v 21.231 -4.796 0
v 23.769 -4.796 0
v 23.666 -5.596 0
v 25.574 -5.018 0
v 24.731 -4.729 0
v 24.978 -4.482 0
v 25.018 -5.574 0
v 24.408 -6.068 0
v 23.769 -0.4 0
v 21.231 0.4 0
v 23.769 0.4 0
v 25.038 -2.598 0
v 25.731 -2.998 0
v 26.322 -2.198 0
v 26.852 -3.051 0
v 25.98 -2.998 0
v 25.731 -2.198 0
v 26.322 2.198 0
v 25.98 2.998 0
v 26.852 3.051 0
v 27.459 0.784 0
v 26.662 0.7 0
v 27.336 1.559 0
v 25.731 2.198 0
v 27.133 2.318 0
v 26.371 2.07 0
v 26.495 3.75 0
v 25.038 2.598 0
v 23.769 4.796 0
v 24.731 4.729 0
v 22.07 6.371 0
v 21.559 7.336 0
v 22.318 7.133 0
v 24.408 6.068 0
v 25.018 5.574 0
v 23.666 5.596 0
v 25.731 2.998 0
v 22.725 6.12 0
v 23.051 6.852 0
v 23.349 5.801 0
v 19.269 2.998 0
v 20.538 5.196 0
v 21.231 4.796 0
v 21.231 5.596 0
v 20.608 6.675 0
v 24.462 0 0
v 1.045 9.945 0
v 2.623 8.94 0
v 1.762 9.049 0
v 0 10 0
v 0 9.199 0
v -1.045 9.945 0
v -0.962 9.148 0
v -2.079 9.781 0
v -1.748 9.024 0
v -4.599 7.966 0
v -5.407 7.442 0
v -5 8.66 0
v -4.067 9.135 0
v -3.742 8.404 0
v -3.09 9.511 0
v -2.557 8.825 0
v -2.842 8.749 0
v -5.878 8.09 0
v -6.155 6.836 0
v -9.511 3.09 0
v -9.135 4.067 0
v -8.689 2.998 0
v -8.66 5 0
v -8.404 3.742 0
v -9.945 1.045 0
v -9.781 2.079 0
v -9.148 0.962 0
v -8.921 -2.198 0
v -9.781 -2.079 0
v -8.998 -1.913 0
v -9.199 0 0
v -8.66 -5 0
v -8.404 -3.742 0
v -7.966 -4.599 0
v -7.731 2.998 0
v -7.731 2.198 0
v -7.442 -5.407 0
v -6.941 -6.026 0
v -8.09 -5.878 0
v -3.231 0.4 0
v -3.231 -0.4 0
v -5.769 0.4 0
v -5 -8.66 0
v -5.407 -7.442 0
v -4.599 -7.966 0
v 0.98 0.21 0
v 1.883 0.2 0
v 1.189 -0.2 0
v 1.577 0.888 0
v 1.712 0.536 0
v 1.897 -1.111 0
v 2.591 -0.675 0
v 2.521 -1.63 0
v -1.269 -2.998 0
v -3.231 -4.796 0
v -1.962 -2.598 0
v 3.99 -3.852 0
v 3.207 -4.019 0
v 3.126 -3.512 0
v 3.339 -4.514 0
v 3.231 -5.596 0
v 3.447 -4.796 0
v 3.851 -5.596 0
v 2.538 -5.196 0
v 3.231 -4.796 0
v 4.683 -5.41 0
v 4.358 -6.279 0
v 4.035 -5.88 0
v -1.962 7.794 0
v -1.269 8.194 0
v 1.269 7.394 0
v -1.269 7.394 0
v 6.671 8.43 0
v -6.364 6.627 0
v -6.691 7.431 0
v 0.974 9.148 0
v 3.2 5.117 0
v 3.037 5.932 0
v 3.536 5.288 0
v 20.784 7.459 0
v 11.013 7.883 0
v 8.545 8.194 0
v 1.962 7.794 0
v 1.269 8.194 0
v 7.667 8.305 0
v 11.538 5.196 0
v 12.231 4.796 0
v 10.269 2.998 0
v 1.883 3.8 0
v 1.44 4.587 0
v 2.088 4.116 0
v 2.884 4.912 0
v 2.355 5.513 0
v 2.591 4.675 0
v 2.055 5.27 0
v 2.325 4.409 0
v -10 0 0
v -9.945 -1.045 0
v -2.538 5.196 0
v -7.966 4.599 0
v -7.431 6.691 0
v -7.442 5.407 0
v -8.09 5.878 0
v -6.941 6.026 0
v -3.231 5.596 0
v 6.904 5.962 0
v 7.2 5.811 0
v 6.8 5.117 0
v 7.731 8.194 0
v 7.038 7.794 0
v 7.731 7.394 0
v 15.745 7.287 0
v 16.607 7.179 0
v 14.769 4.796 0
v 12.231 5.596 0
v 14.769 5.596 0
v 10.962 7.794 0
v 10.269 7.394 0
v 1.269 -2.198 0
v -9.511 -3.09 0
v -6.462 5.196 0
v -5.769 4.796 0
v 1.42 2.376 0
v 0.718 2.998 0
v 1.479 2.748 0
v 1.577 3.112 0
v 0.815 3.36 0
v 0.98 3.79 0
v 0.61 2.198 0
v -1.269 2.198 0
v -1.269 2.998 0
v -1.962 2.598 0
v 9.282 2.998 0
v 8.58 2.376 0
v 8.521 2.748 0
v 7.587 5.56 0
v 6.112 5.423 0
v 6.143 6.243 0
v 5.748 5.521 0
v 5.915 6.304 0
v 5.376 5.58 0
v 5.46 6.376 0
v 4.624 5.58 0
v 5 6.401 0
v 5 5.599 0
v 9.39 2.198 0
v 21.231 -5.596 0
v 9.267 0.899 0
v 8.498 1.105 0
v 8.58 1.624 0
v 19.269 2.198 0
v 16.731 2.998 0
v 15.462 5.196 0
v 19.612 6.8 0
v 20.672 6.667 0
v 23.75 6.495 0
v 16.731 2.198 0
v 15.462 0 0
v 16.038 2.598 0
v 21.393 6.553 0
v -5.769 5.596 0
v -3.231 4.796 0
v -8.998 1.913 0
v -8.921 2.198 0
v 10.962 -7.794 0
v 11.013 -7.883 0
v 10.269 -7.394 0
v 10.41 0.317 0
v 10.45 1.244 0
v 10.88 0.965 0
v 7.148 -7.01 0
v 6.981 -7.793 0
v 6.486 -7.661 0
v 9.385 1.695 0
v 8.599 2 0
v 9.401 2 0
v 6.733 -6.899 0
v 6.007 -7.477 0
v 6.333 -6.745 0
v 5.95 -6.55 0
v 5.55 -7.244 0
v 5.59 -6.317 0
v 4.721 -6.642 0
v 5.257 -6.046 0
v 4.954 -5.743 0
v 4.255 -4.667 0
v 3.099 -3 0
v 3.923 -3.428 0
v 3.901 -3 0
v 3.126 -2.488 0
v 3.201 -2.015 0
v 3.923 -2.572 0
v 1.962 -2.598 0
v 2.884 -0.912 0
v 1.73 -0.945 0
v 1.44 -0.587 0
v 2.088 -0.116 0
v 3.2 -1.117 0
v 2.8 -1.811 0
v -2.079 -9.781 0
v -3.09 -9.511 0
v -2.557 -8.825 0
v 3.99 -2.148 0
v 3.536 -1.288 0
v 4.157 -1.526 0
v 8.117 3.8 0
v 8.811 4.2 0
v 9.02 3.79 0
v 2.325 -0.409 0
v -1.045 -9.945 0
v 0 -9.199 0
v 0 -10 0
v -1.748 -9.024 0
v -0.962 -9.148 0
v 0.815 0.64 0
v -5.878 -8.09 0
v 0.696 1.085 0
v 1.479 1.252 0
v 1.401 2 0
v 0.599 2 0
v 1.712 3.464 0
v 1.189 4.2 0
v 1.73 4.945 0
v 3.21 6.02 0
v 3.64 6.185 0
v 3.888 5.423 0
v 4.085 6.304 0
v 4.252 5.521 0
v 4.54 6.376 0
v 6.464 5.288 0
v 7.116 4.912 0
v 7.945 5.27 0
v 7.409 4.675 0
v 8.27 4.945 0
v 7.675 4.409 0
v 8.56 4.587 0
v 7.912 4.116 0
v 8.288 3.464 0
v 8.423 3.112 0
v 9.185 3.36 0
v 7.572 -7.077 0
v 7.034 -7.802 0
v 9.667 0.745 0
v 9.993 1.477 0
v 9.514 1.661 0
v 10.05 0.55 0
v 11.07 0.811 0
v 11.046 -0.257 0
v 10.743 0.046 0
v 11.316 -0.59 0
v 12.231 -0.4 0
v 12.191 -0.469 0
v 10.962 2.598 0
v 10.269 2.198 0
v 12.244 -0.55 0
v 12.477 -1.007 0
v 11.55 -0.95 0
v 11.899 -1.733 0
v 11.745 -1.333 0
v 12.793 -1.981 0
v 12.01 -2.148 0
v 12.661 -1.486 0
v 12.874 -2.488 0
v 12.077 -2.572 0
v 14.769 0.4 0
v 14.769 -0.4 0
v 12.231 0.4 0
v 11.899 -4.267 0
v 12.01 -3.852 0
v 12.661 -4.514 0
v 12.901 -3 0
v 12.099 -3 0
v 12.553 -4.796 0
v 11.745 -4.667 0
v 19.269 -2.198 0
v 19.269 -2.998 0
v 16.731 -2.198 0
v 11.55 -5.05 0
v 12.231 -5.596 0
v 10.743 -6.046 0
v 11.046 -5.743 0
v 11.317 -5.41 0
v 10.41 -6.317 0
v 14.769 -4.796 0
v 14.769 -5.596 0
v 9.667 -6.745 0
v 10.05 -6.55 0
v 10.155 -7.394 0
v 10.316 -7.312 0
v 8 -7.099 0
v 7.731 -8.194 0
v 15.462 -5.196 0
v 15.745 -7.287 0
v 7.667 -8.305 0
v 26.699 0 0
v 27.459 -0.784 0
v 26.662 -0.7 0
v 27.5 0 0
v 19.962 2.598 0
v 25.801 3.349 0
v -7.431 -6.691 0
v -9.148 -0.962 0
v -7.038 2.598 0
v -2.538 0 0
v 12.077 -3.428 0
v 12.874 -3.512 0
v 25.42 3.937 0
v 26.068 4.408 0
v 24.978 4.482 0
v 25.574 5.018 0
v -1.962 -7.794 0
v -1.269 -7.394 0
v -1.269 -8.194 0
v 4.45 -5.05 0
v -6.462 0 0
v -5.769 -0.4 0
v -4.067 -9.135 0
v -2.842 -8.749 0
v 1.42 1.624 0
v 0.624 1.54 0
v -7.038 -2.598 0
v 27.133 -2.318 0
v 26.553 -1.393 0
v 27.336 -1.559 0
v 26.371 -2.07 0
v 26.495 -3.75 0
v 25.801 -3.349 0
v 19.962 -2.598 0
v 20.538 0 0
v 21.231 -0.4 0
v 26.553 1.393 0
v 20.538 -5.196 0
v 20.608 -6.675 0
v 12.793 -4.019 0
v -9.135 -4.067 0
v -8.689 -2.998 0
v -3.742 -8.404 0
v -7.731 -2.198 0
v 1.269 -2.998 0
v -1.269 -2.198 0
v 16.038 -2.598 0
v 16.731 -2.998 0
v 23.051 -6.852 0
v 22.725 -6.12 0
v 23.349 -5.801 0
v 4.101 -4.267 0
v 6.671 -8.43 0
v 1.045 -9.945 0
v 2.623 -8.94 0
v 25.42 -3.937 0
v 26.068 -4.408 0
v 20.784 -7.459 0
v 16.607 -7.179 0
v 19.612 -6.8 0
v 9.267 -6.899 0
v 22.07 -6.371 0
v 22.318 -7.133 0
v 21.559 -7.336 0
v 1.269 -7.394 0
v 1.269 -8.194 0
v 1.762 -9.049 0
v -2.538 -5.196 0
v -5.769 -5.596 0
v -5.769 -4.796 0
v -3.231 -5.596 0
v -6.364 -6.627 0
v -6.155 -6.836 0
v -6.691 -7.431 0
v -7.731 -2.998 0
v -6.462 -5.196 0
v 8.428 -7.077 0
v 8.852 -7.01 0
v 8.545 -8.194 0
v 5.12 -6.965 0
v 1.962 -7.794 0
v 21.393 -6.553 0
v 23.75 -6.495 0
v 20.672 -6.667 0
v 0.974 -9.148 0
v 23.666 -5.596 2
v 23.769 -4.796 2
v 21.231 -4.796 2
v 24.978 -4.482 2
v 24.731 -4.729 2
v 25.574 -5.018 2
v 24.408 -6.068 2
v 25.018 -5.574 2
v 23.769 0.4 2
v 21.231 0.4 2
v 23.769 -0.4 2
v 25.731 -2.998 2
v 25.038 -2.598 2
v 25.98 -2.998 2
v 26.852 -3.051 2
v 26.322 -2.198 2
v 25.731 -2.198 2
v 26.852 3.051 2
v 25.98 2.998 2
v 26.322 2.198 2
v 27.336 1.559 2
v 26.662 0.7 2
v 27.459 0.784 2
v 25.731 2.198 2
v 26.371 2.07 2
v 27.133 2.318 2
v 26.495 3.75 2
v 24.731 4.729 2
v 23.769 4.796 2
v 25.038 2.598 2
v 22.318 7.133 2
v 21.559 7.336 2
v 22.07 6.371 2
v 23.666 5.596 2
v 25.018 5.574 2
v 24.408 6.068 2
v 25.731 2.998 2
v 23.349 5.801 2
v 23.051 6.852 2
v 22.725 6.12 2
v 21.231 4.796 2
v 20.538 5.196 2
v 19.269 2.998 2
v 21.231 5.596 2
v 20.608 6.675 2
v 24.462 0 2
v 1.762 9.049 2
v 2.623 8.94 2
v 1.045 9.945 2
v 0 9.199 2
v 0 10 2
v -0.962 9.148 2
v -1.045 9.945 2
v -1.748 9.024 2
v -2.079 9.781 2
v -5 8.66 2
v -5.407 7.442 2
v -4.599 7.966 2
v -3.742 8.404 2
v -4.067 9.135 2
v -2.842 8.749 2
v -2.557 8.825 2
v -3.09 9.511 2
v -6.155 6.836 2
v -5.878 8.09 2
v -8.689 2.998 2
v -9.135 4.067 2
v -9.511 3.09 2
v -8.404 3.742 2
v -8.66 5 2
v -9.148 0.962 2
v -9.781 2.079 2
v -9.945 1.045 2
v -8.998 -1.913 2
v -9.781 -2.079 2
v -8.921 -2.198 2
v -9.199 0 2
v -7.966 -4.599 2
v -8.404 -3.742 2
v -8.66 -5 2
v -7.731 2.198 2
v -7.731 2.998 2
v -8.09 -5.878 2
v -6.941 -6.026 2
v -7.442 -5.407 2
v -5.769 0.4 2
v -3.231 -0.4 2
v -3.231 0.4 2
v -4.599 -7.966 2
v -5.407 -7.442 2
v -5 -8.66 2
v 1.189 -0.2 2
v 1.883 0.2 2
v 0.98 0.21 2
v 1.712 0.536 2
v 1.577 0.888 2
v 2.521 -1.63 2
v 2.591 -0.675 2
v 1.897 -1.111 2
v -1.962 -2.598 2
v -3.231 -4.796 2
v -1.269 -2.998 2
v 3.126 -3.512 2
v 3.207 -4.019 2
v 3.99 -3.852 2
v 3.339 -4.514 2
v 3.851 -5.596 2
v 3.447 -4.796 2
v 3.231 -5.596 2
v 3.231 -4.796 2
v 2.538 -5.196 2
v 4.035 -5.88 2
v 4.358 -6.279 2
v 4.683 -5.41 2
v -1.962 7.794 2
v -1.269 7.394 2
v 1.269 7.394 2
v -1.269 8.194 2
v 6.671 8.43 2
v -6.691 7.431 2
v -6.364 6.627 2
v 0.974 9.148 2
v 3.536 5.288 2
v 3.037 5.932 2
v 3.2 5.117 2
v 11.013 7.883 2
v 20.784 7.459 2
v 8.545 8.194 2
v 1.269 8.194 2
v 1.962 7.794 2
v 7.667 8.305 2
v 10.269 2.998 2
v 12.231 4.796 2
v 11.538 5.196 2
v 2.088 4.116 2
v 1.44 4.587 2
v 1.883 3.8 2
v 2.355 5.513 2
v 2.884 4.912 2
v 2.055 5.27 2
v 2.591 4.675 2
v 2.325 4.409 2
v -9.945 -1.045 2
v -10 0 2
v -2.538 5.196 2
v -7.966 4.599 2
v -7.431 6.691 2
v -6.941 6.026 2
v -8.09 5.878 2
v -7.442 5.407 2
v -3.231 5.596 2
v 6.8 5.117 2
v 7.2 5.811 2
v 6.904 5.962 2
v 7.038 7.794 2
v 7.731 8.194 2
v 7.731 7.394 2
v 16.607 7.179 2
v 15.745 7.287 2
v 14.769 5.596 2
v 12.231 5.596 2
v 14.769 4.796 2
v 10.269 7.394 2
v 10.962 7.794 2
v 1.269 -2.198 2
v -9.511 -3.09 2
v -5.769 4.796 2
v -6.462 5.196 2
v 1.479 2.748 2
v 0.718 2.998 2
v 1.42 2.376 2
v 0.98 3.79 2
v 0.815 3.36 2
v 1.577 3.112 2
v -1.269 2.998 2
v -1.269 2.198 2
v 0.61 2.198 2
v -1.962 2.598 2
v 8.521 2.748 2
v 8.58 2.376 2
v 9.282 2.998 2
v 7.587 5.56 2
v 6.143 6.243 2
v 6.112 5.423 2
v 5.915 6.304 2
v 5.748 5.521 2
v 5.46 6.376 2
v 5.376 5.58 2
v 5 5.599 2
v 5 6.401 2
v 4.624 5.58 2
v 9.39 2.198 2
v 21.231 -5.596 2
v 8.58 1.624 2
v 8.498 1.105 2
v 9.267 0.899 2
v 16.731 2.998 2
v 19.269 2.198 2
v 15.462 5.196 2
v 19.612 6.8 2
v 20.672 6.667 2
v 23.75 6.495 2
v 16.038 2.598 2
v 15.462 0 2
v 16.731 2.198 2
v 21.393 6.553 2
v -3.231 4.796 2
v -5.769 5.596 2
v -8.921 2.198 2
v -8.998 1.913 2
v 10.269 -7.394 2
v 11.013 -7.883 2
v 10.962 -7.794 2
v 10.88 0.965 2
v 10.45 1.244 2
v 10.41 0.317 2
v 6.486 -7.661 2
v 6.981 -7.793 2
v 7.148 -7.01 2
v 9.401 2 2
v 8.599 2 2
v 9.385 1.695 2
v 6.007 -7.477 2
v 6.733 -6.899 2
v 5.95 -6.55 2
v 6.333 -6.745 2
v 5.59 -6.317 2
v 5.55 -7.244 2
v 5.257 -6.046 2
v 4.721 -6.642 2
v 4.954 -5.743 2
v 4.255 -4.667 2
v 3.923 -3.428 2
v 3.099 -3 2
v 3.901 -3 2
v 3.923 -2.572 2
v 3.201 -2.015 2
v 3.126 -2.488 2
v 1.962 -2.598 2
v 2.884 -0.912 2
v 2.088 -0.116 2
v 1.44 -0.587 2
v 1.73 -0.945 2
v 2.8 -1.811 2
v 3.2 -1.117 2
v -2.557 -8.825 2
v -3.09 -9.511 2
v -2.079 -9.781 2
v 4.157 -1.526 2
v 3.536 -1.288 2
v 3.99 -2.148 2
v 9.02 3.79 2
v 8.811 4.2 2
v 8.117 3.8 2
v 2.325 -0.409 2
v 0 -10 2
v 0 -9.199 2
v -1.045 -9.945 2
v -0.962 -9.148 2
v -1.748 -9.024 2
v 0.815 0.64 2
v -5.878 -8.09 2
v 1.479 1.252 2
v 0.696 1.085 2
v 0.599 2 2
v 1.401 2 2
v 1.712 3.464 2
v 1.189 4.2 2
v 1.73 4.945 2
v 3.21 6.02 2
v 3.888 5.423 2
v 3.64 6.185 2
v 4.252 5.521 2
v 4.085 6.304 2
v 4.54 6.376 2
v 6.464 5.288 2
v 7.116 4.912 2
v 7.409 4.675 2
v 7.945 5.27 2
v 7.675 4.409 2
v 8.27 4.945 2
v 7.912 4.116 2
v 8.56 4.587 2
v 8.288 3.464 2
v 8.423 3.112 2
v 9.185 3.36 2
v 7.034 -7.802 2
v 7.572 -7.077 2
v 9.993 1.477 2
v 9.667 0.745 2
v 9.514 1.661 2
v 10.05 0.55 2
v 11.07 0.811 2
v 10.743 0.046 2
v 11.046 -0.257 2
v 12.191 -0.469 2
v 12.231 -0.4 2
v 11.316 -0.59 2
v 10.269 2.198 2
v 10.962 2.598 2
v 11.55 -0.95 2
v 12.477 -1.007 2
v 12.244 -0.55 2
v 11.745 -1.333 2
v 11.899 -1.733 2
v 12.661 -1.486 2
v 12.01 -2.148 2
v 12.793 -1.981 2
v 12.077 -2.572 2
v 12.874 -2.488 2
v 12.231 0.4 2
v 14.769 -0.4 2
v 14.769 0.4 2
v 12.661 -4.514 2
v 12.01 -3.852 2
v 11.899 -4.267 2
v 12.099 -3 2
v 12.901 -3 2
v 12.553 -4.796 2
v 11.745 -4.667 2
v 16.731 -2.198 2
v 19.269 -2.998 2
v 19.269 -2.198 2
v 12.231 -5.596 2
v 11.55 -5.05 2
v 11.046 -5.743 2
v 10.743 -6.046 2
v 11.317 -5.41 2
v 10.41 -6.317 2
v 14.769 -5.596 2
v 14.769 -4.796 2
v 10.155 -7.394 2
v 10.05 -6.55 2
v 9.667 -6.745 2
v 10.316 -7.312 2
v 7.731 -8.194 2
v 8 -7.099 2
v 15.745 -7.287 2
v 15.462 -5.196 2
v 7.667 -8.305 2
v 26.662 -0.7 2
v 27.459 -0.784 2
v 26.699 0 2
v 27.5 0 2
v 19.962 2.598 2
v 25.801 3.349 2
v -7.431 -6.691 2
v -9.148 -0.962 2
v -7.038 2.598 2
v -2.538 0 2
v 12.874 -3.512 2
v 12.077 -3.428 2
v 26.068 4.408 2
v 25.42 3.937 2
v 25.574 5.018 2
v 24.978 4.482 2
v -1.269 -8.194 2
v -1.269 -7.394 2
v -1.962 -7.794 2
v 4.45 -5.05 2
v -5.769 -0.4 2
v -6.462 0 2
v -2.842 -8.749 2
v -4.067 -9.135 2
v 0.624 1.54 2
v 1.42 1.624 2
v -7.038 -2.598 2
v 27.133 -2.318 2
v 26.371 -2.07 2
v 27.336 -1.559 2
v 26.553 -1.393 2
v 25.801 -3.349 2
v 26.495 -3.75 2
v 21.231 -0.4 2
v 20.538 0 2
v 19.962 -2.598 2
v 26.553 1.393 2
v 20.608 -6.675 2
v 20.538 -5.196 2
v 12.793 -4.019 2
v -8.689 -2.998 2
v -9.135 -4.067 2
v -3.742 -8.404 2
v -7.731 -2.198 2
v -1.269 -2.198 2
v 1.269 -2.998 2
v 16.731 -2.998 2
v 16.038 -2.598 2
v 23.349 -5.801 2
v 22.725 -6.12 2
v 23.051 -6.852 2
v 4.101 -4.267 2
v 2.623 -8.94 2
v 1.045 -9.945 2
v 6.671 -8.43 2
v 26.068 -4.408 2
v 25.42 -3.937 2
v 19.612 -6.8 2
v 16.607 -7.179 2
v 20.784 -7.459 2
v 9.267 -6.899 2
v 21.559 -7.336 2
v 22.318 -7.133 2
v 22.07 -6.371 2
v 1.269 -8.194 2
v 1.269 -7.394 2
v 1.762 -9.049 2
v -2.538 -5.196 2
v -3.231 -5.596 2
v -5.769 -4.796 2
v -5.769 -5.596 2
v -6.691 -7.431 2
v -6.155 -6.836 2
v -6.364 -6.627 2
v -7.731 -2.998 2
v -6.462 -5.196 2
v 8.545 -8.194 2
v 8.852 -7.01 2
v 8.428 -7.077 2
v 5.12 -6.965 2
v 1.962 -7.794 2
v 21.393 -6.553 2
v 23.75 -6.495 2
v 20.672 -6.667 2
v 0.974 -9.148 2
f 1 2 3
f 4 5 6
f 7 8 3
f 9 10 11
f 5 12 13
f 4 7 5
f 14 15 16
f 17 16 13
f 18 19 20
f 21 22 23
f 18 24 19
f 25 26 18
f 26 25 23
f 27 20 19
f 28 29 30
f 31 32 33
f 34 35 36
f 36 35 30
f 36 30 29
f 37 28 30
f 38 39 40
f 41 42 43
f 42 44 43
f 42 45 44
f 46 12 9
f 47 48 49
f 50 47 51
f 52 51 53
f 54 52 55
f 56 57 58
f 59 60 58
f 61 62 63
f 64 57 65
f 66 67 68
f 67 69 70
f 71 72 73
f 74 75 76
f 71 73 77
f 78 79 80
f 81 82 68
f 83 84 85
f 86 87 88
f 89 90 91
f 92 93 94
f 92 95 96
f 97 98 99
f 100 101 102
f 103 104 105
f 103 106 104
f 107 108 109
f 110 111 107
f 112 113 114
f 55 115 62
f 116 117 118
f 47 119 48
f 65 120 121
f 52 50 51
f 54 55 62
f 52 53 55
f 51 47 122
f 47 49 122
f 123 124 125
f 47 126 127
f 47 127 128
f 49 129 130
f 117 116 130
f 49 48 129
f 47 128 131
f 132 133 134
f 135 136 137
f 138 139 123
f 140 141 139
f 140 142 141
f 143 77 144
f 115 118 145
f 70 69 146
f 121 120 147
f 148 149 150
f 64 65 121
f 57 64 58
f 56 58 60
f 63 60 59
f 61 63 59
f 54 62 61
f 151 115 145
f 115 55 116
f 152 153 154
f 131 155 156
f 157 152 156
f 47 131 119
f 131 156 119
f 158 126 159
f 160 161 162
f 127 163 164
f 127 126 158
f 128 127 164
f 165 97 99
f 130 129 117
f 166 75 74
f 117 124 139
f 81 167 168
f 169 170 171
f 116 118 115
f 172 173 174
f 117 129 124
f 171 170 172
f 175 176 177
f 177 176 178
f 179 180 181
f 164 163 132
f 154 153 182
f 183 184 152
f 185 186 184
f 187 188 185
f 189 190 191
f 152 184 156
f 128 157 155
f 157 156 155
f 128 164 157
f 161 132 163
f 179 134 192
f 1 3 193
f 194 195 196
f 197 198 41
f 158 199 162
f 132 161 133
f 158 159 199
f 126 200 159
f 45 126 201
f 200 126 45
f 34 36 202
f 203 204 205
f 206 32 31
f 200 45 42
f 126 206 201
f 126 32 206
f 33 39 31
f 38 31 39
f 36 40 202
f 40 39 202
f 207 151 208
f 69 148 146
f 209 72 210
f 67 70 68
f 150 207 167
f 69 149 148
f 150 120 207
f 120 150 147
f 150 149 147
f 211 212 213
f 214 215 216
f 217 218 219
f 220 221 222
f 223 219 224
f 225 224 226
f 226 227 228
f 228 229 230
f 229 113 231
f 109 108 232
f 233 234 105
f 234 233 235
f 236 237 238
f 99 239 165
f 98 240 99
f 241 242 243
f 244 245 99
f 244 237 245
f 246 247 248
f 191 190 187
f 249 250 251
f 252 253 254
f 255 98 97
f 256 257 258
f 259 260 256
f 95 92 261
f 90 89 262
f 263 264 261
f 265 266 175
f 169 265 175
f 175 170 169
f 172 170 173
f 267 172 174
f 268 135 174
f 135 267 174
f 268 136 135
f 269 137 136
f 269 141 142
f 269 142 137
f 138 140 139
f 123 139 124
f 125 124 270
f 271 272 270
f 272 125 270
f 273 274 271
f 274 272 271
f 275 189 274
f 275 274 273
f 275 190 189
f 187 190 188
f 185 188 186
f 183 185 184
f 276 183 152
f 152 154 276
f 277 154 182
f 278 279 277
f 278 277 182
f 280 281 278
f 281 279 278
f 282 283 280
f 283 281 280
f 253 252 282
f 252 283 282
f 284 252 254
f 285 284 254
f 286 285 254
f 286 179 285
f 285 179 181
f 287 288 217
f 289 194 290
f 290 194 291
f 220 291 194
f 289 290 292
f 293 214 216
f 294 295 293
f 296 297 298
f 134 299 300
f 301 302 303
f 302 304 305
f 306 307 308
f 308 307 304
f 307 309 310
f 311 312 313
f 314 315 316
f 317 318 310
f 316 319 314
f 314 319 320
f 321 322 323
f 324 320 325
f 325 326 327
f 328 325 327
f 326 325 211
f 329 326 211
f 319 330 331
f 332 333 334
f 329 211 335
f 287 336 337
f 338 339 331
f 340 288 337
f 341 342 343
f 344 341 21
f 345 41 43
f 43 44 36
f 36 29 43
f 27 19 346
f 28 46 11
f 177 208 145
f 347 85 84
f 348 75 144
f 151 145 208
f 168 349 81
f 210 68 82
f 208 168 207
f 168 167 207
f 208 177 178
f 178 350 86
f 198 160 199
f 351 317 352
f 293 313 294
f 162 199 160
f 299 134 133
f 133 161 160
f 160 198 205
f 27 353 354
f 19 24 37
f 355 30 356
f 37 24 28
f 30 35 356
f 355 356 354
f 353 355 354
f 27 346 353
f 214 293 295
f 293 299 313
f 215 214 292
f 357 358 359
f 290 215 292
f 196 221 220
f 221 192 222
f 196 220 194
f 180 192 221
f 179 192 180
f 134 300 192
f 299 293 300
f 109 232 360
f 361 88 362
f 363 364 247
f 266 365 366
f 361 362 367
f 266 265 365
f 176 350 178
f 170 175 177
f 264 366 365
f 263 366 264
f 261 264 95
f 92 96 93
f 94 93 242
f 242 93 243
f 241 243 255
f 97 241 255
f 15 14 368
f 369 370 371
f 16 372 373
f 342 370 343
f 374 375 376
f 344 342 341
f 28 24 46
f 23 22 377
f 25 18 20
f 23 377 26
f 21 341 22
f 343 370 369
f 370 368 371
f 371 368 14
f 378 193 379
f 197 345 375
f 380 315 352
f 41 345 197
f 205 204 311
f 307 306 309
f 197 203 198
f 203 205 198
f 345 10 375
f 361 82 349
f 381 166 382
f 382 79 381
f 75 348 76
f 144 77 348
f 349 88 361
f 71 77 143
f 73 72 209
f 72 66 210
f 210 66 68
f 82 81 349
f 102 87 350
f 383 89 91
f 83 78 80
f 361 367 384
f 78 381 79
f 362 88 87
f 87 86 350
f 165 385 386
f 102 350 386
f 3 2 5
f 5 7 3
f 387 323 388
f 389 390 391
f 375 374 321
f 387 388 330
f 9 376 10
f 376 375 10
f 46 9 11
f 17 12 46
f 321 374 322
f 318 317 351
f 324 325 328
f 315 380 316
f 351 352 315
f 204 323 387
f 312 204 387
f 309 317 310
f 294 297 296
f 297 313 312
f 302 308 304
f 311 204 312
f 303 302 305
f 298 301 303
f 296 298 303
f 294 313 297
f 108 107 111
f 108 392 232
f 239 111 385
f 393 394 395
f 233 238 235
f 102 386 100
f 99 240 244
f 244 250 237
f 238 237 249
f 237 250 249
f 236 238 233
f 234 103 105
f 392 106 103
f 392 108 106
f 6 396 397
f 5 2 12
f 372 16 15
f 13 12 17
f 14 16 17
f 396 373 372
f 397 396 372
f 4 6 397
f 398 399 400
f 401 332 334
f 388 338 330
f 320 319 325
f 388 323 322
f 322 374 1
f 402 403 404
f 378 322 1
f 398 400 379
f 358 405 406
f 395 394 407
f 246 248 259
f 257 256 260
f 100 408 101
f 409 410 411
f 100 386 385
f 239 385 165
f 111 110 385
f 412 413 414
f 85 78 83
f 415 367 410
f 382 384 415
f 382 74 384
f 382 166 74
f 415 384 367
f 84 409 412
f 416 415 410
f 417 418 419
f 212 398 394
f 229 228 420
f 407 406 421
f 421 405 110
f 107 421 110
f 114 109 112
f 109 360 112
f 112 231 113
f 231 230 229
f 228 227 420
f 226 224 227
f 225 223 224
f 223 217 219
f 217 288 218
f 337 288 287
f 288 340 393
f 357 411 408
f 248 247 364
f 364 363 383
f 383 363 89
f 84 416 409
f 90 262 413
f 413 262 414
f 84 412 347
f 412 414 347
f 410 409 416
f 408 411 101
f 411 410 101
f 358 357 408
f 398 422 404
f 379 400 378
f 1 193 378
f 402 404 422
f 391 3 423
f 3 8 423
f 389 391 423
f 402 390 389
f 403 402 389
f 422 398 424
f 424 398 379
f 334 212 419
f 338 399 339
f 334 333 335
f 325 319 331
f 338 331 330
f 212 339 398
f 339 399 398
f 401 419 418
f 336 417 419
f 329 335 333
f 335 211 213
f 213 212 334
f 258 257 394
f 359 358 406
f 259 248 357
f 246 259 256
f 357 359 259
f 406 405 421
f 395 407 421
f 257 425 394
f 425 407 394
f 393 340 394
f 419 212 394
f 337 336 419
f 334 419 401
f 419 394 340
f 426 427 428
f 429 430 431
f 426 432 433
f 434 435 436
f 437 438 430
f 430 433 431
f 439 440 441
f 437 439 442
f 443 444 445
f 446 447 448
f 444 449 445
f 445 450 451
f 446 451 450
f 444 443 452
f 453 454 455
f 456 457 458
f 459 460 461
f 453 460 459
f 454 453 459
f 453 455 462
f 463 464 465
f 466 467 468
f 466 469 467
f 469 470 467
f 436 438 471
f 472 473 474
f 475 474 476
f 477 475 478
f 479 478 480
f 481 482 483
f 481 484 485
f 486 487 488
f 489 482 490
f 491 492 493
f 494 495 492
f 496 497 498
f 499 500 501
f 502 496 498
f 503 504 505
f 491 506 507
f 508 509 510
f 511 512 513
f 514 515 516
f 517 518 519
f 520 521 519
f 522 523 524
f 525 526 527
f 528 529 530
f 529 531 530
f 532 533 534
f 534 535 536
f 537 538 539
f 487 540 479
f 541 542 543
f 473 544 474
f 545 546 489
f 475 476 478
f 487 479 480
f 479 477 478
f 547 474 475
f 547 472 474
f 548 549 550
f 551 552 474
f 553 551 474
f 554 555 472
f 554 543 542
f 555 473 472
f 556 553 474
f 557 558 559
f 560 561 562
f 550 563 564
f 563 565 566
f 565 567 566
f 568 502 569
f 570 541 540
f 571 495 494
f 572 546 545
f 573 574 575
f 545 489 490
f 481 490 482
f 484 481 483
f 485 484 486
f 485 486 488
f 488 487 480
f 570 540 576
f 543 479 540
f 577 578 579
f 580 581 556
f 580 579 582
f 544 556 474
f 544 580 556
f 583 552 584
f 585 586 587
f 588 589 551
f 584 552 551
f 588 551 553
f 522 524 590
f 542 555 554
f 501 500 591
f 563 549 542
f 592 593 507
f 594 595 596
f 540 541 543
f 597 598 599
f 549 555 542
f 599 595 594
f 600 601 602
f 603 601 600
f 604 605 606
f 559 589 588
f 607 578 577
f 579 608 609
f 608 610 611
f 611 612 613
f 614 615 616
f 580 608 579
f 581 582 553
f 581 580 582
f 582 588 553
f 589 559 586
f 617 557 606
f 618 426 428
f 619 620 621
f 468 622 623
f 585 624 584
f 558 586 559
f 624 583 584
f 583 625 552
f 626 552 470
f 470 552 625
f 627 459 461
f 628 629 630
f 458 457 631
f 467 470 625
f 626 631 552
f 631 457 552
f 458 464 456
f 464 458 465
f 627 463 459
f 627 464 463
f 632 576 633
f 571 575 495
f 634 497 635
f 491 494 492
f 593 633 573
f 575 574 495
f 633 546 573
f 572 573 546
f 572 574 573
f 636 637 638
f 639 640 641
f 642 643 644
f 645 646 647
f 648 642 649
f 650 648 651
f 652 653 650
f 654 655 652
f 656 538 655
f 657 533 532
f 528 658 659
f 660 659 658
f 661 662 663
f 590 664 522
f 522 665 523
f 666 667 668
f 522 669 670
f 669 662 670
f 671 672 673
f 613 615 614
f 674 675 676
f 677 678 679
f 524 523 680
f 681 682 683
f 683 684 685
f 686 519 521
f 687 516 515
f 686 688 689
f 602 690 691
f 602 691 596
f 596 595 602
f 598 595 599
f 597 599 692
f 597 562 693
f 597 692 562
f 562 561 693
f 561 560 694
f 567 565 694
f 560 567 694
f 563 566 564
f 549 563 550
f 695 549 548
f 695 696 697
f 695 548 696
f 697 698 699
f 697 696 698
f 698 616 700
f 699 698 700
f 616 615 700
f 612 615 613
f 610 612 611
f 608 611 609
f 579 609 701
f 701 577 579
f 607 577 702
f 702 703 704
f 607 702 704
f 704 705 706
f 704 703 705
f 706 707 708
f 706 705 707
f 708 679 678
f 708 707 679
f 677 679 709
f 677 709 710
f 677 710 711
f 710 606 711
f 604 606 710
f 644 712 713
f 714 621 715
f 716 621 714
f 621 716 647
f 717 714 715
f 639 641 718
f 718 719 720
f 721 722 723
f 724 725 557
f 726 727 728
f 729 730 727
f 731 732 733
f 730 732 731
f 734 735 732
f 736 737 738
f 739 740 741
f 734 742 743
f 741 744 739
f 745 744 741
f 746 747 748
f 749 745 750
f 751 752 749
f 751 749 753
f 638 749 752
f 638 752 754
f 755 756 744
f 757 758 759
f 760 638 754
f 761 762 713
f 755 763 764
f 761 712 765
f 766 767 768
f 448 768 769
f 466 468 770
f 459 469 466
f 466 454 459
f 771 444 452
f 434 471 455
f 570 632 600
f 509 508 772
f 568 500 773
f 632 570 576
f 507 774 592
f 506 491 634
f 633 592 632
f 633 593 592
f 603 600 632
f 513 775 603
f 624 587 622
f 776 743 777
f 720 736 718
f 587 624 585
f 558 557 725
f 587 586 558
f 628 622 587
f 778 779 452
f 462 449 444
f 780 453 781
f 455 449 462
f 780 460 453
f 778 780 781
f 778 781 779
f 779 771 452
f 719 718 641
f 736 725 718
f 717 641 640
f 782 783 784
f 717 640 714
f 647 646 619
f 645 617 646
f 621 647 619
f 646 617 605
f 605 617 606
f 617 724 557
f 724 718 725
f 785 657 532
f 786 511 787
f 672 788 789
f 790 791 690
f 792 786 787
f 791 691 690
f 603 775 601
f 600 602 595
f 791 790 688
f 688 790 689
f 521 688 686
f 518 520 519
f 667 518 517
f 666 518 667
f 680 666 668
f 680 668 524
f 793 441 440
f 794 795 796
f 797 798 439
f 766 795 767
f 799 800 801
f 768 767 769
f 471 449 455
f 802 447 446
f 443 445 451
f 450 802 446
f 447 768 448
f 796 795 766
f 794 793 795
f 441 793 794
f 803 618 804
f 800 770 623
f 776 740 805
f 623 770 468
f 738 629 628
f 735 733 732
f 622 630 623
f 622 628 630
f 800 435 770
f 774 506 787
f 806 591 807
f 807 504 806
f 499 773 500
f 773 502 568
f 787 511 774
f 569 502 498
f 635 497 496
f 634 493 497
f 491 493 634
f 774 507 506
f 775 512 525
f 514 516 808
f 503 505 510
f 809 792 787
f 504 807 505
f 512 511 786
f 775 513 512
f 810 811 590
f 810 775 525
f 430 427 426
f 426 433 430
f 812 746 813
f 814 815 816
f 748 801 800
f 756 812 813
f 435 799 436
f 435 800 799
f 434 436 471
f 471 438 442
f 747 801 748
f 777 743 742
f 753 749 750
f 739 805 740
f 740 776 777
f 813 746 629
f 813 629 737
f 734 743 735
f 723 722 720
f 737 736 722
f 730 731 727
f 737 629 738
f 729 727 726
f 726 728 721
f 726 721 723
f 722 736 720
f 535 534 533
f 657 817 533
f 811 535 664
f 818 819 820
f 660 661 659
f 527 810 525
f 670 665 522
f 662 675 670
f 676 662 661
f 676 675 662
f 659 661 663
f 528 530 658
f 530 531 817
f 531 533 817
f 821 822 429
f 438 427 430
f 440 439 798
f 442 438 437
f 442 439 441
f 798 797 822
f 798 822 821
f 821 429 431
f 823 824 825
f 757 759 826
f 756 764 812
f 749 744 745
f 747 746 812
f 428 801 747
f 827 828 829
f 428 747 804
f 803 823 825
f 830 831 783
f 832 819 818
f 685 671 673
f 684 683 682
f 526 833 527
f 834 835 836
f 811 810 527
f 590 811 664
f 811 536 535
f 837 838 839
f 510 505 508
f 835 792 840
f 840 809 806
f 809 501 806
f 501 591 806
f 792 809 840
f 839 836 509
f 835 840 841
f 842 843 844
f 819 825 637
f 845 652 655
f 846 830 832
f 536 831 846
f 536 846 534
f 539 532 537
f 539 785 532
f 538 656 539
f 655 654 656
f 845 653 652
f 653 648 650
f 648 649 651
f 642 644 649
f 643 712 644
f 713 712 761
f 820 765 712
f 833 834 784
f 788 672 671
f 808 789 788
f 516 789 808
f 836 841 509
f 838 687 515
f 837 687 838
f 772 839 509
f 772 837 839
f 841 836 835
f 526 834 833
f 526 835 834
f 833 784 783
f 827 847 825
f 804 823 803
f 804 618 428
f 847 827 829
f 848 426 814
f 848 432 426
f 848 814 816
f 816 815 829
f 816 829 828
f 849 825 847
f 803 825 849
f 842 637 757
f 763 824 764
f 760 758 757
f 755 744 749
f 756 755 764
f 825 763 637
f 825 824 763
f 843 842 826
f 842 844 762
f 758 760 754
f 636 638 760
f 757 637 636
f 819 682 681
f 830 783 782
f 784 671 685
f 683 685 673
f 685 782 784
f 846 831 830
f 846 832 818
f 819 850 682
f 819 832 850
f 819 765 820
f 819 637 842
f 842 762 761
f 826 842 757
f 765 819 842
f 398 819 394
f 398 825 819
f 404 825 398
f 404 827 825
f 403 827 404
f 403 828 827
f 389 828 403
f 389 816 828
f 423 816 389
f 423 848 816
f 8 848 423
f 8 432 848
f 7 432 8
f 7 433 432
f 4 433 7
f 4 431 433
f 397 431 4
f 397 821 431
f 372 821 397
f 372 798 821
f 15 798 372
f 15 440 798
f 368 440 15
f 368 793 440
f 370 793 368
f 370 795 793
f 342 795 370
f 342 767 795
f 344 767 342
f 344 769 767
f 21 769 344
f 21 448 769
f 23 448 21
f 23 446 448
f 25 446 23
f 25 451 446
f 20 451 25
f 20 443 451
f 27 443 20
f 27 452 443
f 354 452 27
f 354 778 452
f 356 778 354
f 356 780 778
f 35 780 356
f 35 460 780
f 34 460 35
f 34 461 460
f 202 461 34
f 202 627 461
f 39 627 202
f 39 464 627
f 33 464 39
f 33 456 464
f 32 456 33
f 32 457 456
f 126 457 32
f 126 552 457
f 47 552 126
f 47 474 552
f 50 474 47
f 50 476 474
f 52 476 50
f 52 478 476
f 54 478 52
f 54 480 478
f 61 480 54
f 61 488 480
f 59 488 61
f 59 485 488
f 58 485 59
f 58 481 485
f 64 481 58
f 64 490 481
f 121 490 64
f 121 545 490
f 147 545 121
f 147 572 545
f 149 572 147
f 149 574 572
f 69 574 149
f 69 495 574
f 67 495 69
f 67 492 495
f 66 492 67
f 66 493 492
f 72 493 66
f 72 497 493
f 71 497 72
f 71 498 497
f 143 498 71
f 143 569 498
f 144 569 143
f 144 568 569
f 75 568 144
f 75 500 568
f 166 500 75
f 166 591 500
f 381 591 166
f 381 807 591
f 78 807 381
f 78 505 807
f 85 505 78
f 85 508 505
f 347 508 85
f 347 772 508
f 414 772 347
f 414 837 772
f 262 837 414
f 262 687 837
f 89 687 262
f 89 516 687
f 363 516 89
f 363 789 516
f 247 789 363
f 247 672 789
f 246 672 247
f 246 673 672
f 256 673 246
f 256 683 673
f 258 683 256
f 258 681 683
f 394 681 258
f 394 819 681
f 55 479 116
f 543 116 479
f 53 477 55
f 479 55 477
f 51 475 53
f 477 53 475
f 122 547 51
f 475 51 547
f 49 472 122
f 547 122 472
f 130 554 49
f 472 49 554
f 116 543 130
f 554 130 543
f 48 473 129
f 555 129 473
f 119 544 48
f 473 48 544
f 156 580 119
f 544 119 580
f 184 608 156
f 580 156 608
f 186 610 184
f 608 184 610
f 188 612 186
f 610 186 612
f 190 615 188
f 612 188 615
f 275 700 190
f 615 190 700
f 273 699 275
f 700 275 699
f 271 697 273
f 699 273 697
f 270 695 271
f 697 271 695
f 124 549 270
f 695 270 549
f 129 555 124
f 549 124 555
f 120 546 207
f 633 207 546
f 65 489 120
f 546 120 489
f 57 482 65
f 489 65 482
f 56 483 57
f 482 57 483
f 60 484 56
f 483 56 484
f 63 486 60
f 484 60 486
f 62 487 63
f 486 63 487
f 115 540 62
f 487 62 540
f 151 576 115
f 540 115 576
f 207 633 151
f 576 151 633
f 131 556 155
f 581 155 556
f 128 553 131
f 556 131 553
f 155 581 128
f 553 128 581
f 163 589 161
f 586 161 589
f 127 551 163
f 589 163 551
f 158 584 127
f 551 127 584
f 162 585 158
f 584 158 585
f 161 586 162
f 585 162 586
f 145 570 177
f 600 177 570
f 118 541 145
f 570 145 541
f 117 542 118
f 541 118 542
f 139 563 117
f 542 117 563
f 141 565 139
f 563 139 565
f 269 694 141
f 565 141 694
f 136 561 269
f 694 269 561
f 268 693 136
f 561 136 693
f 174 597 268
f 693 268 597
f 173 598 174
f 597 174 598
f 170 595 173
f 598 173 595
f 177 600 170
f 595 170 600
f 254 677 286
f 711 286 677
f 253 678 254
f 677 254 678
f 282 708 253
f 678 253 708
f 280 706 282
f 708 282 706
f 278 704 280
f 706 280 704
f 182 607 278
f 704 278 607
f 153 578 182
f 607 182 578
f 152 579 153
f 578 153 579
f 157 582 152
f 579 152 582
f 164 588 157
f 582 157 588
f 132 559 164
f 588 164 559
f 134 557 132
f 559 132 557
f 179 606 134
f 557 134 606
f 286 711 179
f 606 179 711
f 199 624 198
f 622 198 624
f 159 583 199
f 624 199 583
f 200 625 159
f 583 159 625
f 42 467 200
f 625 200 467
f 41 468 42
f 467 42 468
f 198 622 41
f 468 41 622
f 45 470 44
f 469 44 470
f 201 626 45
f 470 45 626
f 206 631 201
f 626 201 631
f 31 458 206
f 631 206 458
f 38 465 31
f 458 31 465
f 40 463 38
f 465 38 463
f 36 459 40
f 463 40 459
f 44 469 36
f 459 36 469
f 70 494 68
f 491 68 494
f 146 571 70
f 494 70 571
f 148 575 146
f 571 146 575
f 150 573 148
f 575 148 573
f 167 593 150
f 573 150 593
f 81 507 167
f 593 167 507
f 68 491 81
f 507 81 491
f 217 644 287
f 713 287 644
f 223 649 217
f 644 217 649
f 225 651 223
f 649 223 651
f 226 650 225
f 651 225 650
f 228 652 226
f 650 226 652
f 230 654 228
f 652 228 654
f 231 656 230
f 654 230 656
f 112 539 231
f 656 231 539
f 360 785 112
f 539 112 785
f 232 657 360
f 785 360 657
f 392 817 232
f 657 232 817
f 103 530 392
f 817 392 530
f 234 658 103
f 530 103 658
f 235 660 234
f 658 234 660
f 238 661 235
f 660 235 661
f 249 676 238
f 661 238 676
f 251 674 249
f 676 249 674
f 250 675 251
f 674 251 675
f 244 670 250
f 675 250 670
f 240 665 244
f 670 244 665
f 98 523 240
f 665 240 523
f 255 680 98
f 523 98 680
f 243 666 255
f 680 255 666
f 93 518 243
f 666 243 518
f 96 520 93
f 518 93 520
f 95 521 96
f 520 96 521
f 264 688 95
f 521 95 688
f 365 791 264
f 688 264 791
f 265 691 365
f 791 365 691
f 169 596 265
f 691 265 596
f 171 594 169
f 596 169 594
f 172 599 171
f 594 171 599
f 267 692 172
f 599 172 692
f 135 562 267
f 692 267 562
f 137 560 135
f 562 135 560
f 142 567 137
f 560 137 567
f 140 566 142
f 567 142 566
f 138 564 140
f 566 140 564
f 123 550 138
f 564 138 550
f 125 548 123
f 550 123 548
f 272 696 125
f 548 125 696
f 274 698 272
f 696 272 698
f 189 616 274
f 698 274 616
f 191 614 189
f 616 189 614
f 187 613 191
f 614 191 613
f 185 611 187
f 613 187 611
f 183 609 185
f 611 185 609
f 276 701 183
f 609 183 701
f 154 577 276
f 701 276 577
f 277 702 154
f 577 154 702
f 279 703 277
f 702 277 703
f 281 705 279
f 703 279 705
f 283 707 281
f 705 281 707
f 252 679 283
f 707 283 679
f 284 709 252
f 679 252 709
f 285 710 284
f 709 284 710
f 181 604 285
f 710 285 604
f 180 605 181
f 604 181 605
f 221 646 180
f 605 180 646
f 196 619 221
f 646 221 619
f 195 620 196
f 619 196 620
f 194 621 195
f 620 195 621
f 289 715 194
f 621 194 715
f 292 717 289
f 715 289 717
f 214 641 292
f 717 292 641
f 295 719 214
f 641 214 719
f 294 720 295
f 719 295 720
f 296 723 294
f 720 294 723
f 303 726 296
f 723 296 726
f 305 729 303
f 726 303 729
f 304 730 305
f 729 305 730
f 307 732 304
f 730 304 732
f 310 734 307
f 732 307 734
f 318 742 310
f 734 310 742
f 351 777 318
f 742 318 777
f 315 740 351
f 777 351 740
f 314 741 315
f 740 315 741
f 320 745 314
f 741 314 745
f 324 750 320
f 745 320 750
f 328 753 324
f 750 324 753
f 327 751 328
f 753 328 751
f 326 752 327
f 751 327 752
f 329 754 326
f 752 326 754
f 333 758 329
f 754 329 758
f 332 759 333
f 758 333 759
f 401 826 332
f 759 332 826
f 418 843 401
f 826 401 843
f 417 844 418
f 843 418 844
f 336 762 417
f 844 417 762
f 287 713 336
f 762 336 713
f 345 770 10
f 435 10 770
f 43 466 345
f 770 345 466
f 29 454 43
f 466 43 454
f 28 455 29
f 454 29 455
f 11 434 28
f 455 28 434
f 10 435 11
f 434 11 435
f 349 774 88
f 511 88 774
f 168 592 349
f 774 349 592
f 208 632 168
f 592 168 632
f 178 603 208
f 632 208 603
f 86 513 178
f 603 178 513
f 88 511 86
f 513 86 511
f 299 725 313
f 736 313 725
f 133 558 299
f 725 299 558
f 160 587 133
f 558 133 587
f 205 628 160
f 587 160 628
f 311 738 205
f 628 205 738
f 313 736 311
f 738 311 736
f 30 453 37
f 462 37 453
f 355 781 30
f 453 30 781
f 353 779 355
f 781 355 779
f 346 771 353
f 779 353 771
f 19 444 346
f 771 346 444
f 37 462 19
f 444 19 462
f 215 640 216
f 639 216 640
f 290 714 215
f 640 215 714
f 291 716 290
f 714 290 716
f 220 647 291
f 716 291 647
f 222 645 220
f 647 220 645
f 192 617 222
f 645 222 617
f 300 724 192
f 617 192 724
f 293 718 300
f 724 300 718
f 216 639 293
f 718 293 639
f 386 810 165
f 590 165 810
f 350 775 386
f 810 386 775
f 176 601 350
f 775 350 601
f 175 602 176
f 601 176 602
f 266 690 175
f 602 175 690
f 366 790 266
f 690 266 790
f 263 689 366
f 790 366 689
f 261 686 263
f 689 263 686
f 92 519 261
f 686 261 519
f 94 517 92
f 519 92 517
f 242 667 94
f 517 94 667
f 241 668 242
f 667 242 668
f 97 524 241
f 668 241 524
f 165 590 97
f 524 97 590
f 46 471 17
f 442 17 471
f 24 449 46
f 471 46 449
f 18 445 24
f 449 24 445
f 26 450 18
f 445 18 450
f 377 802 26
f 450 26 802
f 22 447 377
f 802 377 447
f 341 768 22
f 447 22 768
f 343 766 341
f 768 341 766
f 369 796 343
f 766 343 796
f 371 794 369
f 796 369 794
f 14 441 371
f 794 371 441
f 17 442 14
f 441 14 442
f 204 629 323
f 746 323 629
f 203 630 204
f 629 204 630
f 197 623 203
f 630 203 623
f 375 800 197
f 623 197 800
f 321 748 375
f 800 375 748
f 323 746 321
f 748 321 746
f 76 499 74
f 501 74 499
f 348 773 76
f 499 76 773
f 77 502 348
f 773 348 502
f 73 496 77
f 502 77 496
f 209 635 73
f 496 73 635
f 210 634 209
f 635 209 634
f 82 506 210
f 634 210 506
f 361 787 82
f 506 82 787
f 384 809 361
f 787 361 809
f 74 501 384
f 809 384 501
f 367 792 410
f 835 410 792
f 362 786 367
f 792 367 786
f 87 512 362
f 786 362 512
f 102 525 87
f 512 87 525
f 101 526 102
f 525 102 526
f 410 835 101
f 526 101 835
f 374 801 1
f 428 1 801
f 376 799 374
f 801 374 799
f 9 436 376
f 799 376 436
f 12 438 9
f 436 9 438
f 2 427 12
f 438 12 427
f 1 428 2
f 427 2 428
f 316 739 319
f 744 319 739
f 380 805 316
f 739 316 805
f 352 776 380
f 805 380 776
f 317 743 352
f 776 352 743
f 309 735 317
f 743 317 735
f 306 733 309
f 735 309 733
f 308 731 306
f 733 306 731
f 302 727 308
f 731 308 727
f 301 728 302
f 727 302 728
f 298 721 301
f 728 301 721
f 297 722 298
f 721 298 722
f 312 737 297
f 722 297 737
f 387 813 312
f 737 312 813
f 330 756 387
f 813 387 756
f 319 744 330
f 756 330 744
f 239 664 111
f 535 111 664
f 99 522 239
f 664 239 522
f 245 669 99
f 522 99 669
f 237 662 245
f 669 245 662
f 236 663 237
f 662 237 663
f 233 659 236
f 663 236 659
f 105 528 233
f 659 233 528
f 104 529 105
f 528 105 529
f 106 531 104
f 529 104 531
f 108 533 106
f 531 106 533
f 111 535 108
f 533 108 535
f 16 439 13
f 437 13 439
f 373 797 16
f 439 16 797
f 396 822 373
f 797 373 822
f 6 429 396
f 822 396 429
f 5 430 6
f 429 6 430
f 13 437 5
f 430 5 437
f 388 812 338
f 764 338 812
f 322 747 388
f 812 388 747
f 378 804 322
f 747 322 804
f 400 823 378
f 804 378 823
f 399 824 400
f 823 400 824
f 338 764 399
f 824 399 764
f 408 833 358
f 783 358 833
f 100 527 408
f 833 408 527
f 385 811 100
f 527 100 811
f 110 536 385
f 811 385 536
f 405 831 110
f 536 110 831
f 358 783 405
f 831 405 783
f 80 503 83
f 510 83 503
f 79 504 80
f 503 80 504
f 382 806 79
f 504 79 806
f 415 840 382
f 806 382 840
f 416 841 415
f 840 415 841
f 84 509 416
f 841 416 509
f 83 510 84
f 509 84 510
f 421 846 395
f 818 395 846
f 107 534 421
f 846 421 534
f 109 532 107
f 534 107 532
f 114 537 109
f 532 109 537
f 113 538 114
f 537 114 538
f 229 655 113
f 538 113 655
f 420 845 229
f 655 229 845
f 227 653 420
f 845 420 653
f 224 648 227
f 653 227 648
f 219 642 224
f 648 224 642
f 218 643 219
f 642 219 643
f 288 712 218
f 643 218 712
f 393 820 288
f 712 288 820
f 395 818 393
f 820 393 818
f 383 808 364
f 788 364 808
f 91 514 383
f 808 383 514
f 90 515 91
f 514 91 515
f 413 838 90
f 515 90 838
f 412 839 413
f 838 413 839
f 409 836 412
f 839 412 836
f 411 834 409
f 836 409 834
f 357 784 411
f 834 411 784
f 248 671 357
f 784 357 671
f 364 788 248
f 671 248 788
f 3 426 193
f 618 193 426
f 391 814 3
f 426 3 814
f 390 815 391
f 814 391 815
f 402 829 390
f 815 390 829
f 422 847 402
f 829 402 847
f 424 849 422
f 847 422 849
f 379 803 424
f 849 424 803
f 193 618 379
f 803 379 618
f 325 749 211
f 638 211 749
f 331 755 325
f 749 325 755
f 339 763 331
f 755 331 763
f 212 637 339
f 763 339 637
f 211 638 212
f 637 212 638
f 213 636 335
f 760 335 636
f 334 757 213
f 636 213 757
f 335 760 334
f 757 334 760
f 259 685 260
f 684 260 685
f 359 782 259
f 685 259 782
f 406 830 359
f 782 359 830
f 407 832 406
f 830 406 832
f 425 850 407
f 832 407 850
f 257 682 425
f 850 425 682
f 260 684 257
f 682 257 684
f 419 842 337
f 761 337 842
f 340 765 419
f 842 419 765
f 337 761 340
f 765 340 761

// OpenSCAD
module outline(th) {
    difference() {
        offset(delta= th/2) children();
        offset(delta=-th/2) children();
    }
}

module honeycomb(w, h, d, th, center=false) {
    dx = d * (1+cos(60));
    dy = d * cos(30);
    x0 = -floor(w/2/dx+0.5)*dx + (center ? 0 : w/2);
    y0 = -floor(h/2/dy+0.5)*dy + (center ? 0 : h/2);

    for (y=[y0:dy:y0+h+dy]) {
        for (x=[x0:dx:x0+w+dx]) {
            translate([x, y])
                outline(th) circle(d=d, $fn=6);
        }
    }
    for (y=[y0+dy/2:dy:y0+h+dy]) {
        for (x=[x0+dx/2:dx:x0+w+dx]) {
            translate([x, y])
                outline(th) circle(d=d, $fn=6);
        }
    }
}

module bounded_honeycomb(w, h, d, th, center=false) {
    intersection() {
        honeycomb(w, h, d, th, center);
        children();
    }
    difference() {
       children();
       offset(delta=-th) children();
    }
}

$fn=60;
module test_plate() {
    linear_extrude(2, convexity=10) {
        difference() {
            bounded_honeycomb(80, 60, 6, 0.8, center=true) {
                hull() {
                    translate([ 0, 0]) circle(d=20);
                    translate([ 20, 0]) circle(d=15);
                }
            }
            children();
        }
        for (i=[0:$children-1]) outline(0.8) children(i);
    }
}

test_plate() {
    union() {
        translate([5, 2]) circle(d=8);
        translate([8, -3]) circle(d=9);
    }
}
